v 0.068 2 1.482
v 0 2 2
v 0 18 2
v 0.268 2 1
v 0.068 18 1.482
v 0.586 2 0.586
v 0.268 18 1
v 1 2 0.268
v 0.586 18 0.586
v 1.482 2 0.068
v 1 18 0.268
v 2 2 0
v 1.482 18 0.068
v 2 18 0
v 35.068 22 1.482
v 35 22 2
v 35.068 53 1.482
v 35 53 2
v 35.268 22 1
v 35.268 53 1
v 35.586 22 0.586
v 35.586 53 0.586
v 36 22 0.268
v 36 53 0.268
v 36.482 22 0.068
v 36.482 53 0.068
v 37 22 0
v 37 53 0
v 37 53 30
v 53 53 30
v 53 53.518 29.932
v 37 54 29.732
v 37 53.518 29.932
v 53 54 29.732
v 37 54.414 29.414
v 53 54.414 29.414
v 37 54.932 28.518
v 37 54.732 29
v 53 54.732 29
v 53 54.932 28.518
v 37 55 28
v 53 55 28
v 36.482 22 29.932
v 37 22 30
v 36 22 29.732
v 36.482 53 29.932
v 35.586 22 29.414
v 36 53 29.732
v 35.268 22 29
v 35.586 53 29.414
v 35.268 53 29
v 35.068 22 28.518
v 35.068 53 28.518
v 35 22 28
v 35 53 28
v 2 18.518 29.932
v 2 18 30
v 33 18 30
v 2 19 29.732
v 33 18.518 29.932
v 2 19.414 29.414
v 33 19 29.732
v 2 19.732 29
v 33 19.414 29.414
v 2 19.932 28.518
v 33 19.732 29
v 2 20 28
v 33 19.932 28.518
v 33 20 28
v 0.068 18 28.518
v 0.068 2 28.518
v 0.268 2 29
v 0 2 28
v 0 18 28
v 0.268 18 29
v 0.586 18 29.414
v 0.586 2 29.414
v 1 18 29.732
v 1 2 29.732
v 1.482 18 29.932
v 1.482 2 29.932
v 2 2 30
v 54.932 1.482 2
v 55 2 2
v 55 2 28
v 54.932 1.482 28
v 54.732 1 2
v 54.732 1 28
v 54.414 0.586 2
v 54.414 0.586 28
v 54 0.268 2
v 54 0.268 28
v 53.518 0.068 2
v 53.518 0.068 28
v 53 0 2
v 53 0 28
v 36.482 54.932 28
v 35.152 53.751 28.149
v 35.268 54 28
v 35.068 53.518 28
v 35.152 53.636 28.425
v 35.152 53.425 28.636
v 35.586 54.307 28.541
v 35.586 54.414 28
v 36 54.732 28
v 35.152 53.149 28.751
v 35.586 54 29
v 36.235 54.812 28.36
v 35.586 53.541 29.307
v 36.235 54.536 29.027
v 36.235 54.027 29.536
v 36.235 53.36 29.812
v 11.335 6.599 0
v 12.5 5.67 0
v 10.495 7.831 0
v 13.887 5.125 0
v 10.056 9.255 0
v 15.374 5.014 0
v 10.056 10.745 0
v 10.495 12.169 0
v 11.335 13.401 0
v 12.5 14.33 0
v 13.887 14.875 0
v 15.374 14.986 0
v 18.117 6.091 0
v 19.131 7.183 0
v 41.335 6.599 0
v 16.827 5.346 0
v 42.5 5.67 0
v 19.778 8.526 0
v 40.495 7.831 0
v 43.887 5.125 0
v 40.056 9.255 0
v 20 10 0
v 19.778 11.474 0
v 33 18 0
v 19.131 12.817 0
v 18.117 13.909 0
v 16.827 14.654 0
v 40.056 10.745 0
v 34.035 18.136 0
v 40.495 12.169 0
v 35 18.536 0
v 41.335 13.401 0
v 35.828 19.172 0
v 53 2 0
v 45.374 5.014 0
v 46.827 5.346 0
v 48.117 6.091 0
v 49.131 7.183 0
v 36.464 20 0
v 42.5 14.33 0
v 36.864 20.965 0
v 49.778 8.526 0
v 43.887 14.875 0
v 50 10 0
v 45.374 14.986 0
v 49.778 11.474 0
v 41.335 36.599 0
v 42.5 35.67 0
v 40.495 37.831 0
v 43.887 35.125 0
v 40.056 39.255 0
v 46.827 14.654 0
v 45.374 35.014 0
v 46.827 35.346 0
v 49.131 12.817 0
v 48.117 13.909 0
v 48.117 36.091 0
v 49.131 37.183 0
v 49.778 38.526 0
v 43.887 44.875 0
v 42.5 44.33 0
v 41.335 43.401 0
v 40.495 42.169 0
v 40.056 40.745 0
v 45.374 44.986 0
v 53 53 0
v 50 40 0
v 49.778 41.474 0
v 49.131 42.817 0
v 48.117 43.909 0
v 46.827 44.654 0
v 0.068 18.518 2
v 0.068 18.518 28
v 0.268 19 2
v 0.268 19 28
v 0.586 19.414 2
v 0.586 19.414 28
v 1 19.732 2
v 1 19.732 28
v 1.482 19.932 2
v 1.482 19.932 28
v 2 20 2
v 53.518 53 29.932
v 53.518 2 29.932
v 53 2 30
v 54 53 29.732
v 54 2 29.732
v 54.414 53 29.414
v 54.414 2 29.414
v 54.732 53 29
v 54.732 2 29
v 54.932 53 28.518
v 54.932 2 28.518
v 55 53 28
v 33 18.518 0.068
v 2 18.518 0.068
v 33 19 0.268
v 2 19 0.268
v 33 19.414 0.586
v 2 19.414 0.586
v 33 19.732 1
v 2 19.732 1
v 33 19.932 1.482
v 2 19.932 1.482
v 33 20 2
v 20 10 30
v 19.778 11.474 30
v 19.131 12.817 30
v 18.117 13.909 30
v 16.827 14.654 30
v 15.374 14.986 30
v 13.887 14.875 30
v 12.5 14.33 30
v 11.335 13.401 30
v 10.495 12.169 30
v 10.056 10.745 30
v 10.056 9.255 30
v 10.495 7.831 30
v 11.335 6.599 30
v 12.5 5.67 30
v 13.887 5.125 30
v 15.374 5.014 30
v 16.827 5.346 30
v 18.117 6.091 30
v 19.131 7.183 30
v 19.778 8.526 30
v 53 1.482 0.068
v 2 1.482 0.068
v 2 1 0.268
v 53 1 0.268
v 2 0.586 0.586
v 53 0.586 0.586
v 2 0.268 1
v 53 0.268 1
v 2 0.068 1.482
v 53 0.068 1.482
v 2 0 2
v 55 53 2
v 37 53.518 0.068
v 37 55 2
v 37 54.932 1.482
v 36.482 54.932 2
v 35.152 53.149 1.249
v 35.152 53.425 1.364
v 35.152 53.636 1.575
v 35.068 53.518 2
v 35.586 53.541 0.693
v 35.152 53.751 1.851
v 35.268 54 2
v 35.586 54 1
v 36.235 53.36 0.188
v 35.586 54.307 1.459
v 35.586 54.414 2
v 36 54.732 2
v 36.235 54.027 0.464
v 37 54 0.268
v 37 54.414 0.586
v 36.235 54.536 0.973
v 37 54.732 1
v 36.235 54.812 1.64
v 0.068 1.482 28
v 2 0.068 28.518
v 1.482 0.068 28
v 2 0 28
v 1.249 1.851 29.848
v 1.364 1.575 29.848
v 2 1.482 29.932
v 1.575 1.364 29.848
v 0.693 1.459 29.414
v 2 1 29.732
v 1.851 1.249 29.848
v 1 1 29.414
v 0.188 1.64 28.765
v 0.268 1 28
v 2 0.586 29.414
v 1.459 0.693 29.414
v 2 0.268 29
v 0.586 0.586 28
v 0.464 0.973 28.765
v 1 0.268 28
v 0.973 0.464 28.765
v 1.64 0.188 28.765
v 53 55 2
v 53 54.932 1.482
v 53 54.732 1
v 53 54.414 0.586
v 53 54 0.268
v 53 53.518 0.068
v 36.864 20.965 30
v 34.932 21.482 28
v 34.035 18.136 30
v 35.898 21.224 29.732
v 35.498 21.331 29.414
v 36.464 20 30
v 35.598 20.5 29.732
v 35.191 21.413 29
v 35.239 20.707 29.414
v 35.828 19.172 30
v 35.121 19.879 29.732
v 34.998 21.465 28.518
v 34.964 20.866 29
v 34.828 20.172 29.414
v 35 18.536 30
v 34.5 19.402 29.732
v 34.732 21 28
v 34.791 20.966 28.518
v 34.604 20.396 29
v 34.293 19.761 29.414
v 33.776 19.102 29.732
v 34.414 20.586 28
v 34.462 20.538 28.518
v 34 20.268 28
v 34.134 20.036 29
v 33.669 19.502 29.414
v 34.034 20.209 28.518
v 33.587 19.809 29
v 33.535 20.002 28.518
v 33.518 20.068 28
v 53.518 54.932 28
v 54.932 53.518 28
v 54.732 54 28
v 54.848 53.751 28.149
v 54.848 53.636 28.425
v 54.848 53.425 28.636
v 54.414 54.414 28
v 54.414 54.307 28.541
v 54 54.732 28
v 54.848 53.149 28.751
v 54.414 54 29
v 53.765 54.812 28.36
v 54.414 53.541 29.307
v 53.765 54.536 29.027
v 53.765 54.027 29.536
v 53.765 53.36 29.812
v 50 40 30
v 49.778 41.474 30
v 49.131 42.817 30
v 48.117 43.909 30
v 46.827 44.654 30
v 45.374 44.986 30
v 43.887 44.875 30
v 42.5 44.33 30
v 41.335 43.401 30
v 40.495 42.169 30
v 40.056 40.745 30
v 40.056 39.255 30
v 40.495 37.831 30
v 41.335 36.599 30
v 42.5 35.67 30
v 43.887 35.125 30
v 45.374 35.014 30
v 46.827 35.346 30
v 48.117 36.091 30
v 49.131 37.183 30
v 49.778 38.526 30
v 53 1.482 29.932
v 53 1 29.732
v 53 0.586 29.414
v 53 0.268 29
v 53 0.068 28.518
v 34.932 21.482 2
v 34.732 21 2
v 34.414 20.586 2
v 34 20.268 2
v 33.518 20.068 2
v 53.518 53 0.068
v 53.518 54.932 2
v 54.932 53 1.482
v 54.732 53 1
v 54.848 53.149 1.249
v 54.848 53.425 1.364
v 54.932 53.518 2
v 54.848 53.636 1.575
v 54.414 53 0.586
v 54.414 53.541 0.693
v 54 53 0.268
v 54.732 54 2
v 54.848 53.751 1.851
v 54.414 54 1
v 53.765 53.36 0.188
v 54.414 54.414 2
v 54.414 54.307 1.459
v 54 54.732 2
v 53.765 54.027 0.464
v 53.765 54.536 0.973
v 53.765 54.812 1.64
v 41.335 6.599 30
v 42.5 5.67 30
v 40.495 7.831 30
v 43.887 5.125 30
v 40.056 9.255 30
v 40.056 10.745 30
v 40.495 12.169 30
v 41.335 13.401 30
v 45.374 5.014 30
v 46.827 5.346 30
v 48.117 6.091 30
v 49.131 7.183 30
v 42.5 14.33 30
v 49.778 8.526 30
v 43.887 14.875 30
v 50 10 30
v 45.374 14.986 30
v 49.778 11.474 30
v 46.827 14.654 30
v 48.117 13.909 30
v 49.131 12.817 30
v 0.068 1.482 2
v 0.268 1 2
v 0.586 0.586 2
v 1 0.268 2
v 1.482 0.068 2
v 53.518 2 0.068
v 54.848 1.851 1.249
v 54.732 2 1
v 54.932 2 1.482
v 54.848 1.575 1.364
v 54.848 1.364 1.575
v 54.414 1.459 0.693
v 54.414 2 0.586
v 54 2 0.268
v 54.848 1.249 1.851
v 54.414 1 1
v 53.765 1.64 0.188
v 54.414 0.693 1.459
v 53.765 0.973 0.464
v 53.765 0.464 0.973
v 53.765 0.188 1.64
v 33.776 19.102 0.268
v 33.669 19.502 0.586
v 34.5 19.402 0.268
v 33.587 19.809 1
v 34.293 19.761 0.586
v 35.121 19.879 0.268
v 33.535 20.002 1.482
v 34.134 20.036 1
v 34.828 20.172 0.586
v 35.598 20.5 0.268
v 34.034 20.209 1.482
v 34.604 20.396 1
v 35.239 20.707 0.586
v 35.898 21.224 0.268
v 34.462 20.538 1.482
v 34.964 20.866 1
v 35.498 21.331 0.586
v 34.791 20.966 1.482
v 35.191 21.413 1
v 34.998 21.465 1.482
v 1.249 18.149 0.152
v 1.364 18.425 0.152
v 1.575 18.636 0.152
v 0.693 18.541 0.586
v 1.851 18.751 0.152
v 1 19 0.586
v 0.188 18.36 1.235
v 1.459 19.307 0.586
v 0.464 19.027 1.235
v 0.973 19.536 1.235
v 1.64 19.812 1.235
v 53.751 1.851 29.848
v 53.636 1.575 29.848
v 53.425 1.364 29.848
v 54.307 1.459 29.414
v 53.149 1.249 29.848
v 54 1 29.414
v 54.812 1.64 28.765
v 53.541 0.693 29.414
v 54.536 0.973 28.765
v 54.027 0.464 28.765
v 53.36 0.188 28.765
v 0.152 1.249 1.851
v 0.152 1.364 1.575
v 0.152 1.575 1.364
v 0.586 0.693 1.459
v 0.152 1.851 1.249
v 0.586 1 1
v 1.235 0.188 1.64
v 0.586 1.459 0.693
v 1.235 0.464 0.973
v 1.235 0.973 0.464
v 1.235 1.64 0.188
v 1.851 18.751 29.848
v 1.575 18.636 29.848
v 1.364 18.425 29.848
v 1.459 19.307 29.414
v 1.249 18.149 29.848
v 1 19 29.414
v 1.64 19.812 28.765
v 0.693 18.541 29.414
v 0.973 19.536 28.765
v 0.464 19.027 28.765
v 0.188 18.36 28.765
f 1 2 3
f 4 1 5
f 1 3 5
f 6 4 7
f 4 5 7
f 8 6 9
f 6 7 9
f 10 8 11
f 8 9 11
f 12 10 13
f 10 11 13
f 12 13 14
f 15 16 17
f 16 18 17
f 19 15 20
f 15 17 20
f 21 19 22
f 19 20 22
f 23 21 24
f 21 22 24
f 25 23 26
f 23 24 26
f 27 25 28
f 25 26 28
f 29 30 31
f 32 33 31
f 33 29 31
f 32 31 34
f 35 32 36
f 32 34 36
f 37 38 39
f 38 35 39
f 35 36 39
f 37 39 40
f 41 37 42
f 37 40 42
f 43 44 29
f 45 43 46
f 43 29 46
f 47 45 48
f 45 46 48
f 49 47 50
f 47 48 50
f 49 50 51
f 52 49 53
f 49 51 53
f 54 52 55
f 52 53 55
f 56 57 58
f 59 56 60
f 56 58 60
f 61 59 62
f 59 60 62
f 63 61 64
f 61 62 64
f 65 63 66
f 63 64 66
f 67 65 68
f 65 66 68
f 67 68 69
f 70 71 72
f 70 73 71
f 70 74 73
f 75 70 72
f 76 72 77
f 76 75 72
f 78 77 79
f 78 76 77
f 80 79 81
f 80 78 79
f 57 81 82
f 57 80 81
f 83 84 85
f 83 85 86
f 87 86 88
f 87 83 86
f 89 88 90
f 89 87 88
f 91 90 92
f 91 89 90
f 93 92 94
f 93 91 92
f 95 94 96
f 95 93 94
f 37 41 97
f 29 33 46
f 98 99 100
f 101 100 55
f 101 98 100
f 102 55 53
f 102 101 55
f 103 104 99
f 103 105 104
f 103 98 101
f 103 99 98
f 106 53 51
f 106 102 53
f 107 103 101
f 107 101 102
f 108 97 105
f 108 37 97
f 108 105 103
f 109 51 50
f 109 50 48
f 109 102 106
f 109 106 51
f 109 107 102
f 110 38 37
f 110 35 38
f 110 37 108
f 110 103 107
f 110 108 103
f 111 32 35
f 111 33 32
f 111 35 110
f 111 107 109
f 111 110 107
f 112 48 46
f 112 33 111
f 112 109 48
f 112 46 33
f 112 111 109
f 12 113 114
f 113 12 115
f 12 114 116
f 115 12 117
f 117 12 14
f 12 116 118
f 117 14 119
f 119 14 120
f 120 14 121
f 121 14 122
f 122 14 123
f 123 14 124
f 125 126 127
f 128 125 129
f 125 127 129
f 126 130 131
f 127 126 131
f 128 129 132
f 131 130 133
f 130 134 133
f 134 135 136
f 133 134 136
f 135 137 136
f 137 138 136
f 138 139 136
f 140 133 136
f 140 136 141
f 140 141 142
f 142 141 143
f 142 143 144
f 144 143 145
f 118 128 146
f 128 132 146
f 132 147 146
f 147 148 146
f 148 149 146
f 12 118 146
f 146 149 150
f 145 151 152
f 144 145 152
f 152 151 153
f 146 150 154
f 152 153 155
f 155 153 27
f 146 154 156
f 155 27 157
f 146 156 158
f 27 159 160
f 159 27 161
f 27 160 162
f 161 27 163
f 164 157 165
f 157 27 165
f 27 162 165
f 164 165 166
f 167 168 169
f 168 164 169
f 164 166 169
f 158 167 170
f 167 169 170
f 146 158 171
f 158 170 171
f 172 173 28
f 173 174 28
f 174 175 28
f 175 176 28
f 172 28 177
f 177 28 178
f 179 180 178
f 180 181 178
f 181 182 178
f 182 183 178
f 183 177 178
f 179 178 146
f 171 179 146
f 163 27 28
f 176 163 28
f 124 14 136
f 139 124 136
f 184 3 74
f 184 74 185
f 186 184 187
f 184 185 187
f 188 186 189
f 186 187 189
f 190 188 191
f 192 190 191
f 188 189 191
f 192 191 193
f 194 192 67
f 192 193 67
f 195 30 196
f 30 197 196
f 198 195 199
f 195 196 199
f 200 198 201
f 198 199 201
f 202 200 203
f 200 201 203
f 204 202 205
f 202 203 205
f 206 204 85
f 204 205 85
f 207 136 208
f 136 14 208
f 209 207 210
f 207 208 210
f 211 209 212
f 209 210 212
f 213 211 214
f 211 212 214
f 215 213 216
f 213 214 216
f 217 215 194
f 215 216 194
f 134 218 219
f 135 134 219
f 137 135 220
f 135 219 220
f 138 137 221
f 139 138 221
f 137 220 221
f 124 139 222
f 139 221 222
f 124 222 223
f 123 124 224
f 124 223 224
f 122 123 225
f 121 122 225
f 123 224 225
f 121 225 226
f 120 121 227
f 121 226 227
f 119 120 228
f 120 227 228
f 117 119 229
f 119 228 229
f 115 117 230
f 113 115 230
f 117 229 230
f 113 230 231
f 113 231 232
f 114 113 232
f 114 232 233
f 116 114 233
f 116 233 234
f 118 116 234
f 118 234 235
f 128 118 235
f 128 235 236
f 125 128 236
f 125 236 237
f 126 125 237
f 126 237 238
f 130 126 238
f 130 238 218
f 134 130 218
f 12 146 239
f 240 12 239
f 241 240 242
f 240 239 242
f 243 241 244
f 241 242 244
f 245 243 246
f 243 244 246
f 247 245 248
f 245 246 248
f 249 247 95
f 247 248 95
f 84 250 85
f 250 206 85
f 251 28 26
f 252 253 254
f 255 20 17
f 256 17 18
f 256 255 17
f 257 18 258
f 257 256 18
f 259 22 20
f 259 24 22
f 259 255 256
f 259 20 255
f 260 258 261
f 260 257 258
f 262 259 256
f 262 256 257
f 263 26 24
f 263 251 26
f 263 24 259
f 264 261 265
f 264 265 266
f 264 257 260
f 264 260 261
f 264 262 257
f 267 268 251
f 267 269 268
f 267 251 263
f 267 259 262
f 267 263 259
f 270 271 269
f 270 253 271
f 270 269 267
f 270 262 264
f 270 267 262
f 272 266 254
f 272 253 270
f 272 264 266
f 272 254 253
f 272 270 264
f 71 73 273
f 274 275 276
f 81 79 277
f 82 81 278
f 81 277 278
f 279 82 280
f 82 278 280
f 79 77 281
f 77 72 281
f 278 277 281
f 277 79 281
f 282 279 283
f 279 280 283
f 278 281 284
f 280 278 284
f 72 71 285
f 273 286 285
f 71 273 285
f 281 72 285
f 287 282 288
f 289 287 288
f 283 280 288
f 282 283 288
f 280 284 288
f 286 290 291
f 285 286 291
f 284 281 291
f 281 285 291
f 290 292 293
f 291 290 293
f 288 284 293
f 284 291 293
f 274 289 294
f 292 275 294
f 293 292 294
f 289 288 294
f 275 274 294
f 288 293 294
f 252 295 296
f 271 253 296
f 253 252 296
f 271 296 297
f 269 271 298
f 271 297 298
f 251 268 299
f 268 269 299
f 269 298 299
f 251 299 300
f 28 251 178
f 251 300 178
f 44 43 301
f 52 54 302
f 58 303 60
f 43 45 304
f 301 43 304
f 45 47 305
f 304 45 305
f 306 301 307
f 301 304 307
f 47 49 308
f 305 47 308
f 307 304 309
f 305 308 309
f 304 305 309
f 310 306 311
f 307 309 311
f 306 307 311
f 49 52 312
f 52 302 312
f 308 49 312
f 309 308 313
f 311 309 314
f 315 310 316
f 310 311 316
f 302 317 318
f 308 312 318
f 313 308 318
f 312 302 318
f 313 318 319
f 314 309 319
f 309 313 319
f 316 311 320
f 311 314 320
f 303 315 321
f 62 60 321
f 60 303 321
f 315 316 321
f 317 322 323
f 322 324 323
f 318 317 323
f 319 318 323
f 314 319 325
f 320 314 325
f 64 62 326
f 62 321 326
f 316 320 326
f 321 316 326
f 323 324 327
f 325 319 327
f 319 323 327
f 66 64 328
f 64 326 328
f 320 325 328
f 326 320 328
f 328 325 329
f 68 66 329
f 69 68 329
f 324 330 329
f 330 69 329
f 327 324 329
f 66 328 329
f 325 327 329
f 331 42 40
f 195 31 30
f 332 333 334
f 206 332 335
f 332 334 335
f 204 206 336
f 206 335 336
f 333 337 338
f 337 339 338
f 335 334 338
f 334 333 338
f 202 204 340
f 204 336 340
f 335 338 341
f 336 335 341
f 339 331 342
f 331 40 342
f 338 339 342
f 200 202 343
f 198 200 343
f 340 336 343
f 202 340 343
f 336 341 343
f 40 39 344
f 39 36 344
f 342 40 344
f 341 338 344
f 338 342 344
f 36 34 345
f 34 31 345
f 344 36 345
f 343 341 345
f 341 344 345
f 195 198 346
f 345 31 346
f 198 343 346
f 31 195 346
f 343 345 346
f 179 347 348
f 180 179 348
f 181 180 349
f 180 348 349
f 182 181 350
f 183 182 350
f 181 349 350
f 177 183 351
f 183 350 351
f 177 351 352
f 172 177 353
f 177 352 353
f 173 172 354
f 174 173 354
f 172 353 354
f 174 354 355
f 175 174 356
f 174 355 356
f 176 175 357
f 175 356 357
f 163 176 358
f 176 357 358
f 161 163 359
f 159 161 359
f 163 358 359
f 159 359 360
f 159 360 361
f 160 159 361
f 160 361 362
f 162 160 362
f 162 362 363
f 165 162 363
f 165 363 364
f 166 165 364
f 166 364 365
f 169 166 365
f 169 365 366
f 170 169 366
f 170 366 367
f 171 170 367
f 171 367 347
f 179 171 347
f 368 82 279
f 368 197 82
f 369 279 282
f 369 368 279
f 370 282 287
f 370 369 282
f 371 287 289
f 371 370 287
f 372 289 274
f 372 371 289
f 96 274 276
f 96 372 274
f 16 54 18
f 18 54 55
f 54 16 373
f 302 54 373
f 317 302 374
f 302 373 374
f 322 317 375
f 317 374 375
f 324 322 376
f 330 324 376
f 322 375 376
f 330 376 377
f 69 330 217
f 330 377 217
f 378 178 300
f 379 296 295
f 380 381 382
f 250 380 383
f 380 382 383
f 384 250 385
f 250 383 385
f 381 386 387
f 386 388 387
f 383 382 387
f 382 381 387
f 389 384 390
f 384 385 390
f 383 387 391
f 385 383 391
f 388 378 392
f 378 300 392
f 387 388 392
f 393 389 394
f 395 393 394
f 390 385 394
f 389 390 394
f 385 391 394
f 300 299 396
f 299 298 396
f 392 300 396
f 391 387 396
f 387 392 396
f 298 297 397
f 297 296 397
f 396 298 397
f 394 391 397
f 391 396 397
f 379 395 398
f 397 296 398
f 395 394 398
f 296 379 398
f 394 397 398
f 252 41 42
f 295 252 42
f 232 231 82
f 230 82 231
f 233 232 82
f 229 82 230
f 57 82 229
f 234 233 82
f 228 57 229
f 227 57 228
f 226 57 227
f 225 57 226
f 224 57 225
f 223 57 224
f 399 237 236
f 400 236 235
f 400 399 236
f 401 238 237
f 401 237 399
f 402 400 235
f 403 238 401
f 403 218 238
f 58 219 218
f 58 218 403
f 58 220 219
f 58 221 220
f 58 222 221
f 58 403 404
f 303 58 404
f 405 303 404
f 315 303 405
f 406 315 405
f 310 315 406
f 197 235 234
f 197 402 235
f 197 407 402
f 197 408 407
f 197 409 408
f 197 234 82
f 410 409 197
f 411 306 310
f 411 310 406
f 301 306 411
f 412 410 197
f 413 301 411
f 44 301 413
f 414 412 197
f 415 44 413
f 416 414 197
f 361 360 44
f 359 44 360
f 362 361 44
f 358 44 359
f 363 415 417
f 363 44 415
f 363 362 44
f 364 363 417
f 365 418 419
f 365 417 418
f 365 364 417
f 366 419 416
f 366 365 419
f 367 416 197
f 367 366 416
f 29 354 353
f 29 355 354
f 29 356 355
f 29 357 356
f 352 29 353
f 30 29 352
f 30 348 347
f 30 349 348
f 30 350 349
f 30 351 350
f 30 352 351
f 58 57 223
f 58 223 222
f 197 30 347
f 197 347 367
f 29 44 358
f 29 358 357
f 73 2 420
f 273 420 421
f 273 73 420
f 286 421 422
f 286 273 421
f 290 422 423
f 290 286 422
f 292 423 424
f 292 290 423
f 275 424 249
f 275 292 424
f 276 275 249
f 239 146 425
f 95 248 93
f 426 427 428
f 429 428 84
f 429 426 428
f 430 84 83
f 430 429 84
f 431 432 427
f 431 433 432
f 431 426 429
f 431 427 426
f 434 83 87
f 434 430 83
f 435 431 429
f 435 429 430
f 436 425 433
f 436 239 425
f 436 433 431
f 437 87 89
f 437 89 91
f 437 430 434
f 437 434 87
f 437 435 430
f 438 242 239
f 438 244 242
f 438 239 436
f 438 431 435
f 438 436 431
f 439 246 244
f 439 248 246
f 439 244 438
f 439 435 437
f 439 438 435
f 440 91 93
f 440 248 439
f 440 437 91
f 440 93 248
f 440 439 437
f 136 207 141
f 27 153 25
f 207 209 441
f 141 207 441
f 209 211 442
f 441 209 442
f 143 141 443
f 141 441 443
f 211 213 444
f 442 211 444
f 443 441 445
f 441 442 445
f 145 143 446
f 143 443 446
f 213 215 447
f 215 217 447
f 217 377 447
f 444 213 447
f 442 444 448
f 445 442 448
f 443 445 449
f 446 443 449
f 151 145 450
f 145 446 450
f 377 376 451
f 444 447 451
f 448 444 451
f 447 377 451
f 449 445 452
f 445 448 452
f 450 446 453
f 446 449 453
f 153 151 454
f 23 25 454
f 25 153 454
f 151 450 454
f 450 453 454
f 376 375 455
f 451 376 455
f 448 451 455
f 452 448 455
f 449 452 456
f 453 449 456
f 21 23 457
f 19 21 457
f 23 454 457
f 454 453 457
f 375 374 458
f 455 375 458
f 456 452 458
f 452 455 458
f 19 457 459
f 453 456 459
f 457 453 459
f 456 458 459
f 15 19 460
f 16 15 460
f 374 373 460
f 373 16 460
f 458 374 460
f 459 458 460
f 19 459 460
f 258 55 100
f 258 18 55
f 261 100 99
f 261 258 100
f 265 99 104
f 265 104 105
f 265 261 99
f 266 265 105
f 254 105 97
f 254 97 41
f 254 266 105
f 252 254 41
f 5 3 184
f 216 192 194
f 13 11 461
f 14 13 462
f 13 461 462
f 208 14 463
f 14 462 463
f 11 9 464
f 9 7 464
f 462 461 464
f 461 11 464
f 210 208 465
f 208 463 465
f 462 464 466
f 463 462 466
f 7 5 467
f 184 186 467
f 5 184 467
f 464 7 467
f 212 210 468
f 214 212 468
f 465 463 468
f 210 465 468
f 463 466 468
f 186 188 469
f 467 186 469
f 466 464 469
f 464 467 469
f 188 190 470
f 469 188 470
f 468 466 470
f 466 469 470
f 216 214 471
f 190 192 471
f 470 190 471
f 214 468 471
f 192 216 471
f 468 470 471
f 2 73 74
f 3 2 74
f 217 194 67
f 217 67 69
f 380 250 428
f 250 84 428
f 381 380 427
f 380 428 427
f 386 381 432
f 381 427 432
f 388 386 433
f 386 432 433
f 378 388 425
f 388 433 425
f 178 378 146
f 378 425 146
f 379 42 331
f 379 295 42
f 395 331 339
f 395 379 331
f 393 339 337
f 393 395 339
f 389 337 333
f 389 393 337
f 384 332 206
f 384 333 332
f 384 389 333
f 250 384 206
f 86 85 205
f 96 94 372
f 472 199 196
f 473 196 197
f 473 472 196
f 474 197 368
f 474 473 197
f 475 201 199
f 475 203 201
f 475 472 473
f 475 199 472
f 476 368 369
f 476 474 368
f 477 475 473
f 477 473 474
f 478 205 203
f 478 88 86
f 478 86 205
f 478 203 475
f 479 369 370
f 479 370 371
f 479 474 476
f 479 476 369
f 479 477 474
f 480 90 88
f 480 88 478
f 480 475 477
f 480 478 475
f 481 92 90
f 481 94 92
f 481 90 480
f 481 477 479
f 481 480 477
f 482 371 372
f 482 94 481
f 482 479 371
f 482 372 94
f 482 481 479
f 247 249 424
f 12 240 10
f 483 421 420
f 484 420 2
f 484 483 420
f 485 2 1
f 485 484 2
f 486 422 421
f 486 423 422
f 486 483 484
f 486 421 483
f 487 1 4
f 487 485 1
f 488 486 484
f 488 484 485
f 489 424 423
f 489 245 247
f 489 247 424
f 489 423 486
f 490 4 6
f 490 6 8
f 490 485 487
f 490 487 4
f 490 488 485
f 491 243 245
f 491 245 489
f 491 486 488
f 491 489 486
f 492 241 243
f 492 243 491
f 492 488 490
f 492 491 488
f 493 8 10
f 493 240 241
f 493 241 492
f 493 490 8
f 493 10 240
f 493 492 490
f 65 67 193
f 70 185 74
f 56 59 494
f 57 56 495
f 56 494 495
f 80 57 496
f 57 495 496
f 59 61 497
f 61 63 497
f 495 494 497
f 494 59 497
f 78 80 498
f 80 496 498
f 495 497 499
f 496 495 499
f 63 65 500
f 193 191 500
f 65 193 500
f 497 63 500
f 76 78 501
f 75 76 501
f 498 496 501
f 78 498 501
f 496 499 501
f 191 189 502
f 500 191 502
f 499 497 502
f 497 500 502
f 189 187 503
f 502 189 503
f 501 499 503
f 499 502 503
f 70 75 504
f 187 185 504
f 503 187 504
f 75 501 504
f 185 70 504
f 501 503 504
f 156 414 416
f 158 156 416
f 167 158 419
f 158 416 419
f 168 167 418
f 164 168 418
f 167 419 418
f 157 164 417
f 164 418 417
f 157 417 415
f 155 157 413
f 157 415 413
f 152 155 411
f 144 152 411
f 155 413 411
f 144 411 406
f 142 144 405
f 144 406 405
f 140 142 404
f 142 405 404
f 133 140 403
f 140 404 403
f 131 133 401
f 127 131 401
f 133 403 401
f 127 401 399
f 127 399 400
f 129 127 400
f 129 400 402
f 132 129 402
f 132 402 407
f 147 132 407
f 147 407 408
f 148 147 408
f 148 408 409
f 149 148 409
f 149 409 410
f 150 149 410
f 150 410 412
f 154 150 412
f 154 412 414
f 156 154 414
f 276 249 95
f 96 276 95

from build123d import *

# Parameters (mm, degrees)
SKETCH_1_W          = 60
SKETCH_1_H          = 20
SKETCH_1_W_2        = 30
SKETCH_1_H_2        = 35
EXTRUDE_1_DEPTH     = 30
SKETCH_2_R          = 5
CUT_EXTRUDE_1_DEPTH = 87.746757864
SKETCH_3_W          = 5
SKETCH_3_H          = 35
CUT_EXTRUDE_2_DEPTH = 87.746757864
FILLET_1_R          = 2


with BuildPart() as part:
    # 草图1 → 凸台-拉伸1 (new body)
    with BuildSketch(Plane.XY):
        with Locations((30, 10)):
            Rectangle(SKETCH_1_W, SKETCH_1_H)
        with Locations((45, 37.5)):
            Rectangle(SKETCH_1_W_2, SKETCH_1_H_2)
    extrude(amount=EXTRUDE_1_DEPTH)

    # 草图2 → 切除-拉伸1 (cut, through all)
    with BuildSketch(Plane.XY.offset(30)):
        with Locations((15, 10)):
            Circle(SKETCH_2_R)
        with Locations((45, 10)):
            Circle(SKETCH_2_R)
        with Locations((45, 40)):
            Circle(SKETCH_2_R)
    extrude(amount=-CUT_EXTRUDE_1_DEPTH, mode=Mode.SUBTRACT)

    # 草图3 → 切除-拉伸2 (cut, through all)
    with BuildSketch(Plane.XY.offset(30)):
        with Locations((32.5, 37.5)):
            Rectangle(SKETCH_3_W, SKETCH_3_H)
        Polygon((60, 20), (60, 55), (55, 55), (55, 20), (55, 0), (60, 0), align=None)
    extrude(amount=-CUT_EXTRUDE_2_DEPTH, mode=Mode.SUBTRACT)

    # 圆角1
    fillet_1_edges = [part.edges().sort_by_distance(p)[0] for p in [
        (27.5, 0, 0),
        (0, 0, 15),
        (0, 20, 15),
        (17.5, 20, 30),
        (0, 10, 30),
        (45, 55, 0),
        (45, 55, 30),
        (55, 27.5, 0),
        (55, 0, 15),
        (55, 55, 15),
        (55, 27.5, 30),
        (27.5, 0, 30),
        (35, 37.5, 0),
        (35, 55, 15),
        (35, 20, 15),
        (35, 37.5, 30),
        (0, 10, 0),
        (17.5, 20, 0),
    ]]
    fillet(fillet_1_edges, radius=FILLET_1_R)


solid = part.part
